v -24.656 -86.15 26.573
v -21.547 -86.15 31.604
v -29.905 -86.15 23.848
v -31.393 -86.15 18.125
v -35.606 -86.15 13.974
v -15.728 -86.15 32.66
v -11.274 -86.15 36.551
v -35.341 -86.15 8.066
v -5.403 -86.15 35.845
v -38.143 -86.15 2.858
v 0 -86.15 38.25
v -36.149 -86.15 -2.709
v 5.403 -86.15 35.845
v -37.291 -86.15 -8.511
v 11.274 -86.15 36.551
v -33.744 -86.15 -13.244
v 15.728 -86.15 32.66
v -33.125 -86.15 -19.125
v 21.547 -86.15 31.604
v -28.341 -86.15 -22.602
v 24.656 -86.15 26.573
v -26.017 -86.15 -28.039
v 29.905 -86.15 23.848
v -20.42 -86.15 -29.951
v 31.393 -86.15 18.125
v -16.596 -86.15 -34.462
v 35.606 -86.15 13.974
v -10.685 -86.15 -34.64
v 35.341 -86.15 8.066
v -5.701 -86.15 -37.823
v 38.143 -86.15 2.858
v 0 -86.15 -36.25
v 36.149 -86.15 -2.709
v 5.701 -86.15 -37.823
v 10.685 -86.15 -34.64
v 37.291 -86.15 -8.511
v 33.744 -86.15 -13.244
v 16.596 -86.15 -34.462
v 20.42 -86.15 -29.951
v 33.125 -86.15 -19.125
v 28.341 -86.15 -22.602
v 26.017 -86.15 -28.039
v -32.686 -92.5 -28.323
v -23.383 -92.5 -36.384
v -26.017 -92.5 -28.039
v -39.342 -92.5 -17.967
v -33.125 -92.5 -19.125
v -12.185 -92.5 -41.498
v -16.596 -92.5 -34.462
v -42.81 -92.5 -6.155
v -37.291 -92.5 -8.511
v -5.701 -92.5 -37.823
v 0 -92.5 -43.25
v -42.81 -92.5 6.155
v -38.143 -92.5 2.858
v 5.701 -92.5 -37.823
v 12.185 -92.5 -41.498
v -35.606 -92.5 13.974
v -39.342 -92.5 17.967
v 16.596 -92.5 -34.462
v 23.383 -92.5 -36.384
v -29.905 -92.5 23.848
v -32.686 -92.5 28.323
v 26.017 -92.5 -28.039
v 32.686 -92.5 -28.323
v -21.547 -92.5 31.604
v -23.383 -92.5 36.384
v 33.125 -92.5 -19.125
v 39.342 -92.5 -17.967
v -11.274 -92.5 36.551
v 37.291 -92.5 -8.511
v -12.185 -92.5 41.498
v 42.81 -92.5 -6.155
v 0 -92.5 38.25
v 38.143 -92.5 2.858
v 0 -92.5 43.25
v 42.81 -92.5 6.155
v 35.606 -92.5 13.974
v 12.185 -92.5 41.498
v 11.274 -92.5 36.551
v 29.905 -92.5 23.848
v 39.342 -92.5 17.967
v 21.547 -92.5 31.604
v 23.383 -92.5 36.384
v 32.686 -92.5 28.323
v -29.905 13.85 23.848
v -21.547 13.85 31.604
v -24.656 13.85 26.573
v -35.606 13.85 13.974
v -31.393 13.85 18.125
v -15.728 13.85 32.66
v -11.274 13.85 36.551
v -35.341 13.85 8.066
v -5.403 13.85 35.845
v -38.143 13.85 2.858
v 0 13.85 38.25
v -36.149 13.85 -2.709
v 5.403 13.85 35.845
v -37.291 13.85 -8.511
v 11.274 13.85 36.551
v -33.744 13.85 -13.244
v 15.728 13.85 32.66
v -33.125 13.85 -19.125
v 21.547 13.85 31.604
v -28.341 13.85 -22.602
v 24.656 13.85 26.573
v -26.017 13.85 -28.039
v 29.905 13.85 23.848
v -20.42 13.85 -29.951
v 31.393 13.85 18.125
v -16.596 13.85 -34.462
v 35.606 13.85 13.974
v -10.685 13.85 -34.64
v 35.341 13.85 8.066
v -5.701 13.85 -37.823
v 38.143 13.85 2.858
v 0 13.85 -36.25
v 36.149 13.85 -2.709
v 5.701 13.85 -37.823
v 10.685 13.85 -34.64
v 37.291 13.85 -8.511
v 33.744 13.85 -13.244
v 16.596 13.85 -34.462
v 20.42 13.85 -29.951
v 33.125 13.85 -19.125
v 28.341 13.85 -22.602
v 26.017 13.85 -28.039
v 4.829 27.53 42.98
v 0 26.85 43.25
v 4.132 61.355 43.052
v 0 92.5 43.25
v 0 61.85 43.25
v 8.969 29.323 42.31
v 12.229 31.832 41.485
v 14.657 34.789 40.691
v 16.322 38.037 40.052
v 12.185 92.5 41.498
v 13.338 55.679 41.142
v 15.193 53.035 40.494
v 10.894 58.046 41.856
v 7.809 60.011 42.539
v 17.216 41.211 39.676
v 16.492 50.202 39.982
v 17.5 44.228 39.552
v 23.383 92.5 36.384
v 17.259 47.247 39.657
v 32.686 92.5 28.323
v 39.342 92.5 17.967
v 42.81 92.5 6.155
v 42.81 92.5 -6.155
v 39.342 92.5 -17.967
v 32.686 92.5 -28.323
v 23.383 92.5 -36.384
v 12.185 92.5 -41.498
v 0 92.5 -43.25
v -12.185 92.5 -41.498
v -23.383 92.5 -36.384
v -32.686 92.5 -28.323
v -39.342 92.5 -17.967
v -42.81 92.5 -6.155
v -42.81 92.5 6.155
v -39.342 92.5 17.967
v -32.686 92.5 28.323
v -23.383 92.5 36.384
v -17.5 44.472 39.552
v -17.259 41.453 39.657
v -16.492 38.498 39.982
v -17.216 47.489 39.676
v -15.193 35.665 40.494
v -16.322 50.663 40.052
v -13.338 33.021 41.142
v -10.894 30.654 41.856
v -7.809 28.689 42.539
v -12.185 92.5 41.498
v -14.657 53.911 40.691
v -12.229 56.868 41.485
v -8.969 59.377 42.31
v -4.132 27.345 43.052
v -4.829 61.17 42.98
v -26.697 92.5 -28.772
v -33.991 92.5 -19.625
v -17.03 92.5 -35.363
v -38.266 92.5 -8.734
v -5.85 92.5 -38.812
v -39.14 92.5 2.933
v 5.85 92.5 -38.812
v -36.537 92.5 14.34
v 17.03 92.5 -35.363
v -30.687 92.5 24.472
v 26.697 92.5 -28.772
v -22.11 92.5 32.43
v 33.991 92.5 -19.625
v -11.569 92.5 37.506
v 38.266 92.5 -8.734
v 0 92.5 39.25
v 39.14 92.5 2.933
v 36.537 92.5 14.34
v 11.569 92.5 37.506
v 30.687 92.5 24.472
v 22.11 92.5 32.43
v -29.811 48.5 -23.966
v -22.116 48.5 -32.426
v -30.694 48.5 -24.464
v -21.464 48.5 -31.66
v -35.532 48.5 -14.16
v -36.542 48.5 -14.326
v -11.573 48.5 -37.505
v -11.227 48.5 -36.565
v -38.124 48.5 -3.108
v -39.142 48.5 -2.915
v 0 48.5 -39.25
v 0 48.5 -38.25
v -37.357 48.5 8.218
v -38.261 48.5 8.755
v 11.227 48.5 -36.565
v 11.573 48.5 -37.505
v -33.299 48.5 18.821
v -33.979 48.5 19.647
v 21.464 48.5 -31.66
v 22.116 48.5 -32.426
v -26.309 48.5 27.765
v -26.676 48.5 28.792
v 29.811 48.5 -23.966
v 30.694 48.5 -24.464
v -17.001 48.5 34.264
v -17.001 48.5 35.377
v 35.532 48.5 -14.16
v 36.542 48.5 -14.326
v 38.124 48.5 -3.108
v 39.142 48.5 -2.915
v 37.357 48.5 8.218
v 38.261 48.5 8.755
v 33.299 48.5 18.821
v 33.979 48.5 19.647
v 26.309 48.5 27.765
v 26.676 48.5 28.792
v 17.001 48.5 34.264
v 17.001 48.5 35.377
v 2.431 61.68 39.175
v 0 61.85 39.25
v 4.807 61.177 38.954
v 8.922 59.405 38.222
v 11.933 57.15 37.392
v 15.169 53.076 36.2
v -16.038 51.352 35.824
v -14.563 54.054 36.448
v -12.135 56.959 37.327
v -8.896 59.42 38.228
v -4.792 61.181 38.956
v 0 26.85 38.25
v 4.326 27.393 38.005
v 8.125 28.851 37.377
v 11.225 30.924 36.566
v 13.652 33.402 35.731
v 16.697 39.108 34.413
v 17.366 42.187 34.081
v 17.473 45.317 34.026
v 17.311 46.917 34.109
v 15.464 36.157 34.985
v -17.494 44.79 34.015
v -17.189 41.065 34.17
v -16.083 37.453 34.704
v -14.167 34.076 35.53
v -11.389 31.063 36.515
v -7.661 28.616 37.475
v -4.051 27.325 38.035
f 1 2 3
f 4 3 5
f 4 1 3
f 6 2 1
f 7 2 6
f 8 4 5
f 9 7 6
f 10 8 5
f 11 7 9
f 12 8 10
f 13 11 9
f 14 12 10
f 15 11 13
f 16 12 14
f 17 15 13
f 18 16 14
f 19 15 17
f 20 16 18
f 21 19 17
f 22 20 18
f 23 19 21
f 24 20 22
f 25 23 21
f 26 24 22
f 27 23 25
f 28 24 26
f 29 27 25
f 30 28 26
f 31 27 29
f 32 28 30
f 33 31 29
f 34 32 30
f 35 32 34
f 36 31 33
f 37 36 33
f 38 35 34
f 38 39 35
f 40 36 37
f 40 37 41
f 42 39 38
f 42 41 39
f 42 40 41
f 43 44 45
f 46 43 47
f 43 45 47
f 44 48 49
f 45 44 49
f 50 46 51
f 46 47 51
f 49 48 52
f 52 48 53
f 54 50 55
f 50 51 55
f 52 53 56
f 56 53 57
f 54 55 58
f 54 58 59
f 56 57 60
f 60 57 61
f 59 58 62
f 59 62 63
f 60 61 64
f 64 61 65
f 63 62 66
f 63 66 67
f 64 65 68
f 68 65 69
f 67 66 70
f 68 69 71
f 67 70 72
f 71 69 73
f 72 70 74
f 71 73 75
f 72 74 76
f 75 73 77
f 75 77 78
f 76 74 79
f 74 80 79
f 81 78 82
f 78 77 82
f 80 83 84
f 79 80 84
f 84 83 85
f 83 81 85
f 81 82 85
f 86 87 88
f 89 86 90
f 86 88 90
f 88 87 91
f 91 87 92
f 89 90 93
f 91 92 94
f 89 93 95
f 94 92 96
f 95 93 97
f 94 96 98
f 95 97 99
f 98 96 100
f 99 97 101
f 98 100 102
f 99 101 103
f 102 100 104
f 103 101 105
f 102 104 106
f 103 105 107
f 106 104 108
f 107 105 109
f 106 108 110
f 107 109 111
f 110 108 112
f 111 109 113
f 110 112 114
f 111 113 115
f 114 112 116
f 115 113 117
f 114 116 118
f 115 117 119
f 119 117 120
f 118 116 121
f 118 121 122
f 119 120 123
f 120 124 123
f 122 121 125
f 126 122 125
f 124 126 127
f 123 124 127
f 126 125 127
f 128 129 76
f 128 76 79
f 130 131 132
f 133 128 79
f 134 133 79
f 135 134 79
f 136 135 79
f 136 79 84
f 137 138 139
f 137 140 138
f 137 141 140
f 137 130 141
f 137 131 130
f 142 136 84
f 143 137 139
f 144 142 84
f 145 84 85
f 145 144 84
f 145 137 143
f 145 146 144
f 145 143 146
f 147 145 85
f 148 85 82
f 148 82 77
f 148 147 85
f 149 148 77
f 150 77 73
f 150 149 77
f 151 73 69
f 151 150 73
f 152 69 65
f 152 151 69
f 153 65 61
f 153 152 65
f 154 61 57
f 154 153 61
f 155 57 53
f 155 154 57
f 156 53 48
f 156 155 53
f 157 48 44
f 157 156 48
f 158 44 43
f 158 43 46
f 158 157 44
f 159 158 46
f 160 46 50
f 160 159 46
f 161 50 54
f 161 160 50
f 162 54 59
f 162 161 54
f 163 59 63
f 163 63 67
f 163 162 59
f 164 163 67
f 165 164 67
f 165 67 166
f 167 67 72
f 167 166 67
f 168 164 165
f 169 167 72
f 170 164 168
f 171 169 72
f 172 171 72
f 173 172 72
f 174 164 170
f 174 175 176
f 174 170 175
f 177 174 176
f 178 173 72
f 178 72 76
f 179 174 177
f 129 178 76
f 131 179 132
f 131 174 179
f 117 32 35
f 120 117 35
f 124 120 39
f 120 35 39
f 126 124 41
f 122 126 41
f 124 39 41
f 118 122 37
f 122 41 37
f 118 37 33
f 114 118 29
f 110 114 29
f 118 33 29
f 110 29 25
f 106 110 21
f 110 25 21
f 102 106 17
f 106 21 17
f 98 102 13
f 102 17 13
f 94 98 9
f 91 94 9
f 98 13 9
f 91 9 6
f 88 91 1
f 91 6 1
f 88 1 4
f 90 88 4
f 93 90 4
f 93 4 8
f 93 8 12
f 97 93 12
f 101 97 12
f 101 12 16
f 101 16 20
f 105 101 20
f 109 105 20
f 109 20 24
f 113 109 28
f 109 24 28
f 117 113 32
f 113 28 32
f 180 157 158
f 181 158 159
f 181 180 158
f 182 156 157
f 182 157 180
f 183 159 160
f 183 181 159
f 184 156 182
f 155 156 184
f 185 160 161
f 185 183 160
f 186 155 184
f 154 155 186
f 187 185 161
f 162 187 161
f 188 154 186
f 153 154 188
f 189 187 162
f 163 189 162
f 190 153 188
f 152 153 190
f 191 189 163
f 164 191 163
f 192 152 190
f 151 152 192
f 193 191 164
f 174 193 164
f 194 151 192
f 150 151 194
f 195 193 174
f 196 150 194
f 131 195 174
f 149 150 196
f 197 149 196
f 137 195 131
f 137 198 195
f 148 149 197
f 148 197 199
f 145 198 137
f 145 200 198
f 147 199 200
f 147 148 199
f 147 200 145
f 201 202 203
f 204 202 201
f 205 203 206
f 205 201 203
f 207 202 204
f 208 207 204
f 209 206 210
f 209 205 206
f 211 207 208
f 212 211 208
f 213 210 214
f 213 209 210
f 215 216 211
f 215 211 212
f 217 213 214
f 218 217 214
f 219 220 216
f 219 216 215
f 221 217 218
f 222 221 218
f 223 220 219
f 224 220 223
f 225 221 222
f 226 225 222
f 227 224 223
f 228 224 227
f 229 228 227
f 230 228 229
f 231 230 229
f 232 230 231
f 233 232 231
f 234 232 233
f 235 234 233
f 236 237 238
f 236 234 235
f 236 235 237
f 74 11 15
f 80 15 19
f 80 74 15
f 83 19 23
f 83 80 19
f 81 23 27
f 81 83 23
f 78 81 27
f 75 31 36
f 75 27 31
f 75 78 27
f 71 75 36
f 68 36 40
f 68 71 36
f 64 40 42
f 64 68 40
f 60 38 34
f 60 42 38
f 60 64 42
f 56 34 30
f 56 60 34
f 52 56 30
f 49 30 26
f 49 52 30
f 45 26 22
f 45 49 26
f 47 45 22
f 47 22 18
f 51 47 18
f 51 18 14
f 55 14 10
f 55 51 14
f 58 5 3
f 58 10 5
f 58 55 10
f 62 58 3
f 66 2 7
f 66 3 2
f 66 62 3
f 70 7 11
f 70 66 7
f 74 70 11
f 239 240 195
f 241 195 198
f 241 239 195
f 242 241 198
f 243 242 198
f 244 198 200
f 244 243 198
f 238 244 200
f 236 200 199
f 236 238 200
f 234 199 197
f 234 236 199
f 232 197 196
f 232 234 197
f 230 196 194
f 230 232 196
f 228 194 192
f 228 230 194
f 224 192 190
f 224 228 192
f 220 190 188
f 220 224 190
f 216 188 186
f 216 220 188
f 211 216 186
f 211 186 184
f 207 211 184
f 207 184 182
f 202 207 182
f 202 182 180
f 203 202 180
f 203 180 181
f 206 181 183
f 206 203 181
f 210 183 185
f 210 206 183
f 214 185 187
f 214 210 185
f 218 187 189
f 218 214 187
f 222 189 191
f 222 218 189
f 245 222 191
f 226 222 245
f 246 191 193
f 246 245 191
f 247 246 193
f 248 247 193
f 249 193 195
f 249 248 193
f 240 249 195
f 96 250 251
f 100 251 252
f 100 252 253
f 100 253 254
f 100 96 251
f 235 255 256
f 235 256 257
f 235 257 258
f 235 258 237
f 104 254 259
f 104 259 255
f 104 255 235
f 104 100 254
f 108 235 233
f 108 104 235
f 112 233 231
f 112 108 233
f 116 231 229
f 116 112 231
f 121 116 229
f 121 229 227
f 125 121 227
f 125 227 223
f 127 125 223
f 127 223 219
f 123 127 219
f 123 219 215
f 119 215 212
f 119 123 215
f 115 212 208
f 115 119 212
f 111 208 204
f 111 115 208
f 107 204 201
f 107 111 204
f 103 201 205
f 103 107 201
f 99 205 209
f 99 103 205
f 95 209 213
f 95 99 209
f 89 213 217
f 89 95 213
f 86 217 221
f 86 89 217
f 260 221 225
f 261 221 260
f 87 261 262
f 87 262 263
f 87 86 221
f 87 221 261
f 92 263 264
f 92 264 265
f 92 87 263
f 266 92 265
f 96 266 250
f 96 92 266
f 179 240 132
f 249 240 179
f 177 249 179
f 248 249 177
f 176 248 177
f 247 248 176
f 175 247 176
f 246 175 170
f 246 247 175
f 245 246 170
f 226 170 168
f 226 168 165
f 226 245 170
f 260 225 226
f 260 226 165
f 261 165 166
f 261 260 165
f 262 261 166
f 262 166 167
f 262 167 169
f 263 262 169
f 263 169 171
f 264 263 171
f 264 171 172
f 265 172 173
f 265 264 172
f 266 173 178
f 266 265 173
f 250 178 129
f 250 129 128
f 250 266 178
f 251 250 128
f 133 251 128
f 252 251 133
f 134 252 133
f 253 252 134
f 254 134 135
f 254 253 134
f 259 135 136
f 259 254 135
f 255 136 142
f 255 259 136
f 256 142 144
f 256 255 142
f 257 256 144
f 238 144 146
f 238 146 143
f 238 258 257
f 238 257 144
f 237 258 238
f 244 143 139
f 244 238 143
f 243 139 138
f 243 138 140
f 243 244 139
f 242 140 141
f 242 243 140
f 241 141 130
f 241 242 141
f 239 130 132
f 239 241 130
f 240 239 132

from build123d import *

# Parameters (mm, degrees)
SKETCH1_R           = 43.25
SKETCH1_R_2         = 38.25
BOSS_EXTRUDE1_DEPTH = 92.5
BOSS_EXTRUDE2_START = -6.35
SKETCH2_R           = 38.25
SKETCH2_R_2         = 36.25
BOSS_EXTRUDE2_DEPTH = 100
CUT_EXTRUDE3_START  = -44
SKETCH6_R           = 39.25
SKETCH6_R_2         = 38.25
CUT_EXTRUDE3_DEPTH  = 44
SKETCH8_R           = 17.5
CUT_EXTRUDE5_DEPTH  = 111.893530019


with BuildPart() as part:
    # Sketch1 → Boss-Extrude1 (new, symmetric)
    with BuildSketch(Plane(origin=(0, 0, 0), x_dir=(1, 0, 0), z_dir=(0, 1, 0))):
        with Locations(Location((0, 0, 0), (0, 0, 270))):
            Circle(SKETCH1_R)
        with Locations(Location((0, 0, 0), (0, 0, 270))):
            Circle(SKETCH1_R_2, mode=Mode.SUBTRACT)
    extrude(amount=BOSS_EXTRUDE1_DEPTH, both=True)

    # Sketch2 → Boss-Extrude2 (add)
    with BuildSketch(Plane.XZ.offset(92.5).offset(BOSS_EXTRUDE2_START)):
        with Locations(Location((0, 0, 0), (0, 0, 270))):
            Circle(SKETCH2_R)
        with Locations(Location((0, 0, 0), (0, 0, 270))):
            Circle(SKETCH2_R_2, mode=Mode.SUBTRACT)
    extrude(amount=-BOSS_EXTRUDE2_DEPTH)

    # Sketch6 → Cut-Extrude3 (cut)
    with BuildSketch(Plane(origin=(0, 92.5, 0), x_dir=(1, 0, 0), z_dir=(0, 1, 0)).offset(CUT_EXTRUDE3_START)):
        with Locations(Location((0, 0, 0), (0, 0, 270))):
            Circle(SKETCH6_R)
        with Locations(Location((0, 0, 0), (0, 0, 90))):
            Circle(SKETCH6_R_2, mode=Mode.SUBTRACT)
    extrude(amount=CUT_EXTRUDE3_DEPTH, mode=Mode.SUBTRACT)

    # Sketch8 → Cut-Extrude5 (cut, through all)
    with BuildSketch(Plane.XY):
        with Locations(Location((0, 44.35, 0), (0, 0, 90))):
            Circle(SKETCH8_R)
    extrude(amount=CUT_EXTRUDE5_DEPTH, mode=Mode.SUBTRACT)


solid = part.part
